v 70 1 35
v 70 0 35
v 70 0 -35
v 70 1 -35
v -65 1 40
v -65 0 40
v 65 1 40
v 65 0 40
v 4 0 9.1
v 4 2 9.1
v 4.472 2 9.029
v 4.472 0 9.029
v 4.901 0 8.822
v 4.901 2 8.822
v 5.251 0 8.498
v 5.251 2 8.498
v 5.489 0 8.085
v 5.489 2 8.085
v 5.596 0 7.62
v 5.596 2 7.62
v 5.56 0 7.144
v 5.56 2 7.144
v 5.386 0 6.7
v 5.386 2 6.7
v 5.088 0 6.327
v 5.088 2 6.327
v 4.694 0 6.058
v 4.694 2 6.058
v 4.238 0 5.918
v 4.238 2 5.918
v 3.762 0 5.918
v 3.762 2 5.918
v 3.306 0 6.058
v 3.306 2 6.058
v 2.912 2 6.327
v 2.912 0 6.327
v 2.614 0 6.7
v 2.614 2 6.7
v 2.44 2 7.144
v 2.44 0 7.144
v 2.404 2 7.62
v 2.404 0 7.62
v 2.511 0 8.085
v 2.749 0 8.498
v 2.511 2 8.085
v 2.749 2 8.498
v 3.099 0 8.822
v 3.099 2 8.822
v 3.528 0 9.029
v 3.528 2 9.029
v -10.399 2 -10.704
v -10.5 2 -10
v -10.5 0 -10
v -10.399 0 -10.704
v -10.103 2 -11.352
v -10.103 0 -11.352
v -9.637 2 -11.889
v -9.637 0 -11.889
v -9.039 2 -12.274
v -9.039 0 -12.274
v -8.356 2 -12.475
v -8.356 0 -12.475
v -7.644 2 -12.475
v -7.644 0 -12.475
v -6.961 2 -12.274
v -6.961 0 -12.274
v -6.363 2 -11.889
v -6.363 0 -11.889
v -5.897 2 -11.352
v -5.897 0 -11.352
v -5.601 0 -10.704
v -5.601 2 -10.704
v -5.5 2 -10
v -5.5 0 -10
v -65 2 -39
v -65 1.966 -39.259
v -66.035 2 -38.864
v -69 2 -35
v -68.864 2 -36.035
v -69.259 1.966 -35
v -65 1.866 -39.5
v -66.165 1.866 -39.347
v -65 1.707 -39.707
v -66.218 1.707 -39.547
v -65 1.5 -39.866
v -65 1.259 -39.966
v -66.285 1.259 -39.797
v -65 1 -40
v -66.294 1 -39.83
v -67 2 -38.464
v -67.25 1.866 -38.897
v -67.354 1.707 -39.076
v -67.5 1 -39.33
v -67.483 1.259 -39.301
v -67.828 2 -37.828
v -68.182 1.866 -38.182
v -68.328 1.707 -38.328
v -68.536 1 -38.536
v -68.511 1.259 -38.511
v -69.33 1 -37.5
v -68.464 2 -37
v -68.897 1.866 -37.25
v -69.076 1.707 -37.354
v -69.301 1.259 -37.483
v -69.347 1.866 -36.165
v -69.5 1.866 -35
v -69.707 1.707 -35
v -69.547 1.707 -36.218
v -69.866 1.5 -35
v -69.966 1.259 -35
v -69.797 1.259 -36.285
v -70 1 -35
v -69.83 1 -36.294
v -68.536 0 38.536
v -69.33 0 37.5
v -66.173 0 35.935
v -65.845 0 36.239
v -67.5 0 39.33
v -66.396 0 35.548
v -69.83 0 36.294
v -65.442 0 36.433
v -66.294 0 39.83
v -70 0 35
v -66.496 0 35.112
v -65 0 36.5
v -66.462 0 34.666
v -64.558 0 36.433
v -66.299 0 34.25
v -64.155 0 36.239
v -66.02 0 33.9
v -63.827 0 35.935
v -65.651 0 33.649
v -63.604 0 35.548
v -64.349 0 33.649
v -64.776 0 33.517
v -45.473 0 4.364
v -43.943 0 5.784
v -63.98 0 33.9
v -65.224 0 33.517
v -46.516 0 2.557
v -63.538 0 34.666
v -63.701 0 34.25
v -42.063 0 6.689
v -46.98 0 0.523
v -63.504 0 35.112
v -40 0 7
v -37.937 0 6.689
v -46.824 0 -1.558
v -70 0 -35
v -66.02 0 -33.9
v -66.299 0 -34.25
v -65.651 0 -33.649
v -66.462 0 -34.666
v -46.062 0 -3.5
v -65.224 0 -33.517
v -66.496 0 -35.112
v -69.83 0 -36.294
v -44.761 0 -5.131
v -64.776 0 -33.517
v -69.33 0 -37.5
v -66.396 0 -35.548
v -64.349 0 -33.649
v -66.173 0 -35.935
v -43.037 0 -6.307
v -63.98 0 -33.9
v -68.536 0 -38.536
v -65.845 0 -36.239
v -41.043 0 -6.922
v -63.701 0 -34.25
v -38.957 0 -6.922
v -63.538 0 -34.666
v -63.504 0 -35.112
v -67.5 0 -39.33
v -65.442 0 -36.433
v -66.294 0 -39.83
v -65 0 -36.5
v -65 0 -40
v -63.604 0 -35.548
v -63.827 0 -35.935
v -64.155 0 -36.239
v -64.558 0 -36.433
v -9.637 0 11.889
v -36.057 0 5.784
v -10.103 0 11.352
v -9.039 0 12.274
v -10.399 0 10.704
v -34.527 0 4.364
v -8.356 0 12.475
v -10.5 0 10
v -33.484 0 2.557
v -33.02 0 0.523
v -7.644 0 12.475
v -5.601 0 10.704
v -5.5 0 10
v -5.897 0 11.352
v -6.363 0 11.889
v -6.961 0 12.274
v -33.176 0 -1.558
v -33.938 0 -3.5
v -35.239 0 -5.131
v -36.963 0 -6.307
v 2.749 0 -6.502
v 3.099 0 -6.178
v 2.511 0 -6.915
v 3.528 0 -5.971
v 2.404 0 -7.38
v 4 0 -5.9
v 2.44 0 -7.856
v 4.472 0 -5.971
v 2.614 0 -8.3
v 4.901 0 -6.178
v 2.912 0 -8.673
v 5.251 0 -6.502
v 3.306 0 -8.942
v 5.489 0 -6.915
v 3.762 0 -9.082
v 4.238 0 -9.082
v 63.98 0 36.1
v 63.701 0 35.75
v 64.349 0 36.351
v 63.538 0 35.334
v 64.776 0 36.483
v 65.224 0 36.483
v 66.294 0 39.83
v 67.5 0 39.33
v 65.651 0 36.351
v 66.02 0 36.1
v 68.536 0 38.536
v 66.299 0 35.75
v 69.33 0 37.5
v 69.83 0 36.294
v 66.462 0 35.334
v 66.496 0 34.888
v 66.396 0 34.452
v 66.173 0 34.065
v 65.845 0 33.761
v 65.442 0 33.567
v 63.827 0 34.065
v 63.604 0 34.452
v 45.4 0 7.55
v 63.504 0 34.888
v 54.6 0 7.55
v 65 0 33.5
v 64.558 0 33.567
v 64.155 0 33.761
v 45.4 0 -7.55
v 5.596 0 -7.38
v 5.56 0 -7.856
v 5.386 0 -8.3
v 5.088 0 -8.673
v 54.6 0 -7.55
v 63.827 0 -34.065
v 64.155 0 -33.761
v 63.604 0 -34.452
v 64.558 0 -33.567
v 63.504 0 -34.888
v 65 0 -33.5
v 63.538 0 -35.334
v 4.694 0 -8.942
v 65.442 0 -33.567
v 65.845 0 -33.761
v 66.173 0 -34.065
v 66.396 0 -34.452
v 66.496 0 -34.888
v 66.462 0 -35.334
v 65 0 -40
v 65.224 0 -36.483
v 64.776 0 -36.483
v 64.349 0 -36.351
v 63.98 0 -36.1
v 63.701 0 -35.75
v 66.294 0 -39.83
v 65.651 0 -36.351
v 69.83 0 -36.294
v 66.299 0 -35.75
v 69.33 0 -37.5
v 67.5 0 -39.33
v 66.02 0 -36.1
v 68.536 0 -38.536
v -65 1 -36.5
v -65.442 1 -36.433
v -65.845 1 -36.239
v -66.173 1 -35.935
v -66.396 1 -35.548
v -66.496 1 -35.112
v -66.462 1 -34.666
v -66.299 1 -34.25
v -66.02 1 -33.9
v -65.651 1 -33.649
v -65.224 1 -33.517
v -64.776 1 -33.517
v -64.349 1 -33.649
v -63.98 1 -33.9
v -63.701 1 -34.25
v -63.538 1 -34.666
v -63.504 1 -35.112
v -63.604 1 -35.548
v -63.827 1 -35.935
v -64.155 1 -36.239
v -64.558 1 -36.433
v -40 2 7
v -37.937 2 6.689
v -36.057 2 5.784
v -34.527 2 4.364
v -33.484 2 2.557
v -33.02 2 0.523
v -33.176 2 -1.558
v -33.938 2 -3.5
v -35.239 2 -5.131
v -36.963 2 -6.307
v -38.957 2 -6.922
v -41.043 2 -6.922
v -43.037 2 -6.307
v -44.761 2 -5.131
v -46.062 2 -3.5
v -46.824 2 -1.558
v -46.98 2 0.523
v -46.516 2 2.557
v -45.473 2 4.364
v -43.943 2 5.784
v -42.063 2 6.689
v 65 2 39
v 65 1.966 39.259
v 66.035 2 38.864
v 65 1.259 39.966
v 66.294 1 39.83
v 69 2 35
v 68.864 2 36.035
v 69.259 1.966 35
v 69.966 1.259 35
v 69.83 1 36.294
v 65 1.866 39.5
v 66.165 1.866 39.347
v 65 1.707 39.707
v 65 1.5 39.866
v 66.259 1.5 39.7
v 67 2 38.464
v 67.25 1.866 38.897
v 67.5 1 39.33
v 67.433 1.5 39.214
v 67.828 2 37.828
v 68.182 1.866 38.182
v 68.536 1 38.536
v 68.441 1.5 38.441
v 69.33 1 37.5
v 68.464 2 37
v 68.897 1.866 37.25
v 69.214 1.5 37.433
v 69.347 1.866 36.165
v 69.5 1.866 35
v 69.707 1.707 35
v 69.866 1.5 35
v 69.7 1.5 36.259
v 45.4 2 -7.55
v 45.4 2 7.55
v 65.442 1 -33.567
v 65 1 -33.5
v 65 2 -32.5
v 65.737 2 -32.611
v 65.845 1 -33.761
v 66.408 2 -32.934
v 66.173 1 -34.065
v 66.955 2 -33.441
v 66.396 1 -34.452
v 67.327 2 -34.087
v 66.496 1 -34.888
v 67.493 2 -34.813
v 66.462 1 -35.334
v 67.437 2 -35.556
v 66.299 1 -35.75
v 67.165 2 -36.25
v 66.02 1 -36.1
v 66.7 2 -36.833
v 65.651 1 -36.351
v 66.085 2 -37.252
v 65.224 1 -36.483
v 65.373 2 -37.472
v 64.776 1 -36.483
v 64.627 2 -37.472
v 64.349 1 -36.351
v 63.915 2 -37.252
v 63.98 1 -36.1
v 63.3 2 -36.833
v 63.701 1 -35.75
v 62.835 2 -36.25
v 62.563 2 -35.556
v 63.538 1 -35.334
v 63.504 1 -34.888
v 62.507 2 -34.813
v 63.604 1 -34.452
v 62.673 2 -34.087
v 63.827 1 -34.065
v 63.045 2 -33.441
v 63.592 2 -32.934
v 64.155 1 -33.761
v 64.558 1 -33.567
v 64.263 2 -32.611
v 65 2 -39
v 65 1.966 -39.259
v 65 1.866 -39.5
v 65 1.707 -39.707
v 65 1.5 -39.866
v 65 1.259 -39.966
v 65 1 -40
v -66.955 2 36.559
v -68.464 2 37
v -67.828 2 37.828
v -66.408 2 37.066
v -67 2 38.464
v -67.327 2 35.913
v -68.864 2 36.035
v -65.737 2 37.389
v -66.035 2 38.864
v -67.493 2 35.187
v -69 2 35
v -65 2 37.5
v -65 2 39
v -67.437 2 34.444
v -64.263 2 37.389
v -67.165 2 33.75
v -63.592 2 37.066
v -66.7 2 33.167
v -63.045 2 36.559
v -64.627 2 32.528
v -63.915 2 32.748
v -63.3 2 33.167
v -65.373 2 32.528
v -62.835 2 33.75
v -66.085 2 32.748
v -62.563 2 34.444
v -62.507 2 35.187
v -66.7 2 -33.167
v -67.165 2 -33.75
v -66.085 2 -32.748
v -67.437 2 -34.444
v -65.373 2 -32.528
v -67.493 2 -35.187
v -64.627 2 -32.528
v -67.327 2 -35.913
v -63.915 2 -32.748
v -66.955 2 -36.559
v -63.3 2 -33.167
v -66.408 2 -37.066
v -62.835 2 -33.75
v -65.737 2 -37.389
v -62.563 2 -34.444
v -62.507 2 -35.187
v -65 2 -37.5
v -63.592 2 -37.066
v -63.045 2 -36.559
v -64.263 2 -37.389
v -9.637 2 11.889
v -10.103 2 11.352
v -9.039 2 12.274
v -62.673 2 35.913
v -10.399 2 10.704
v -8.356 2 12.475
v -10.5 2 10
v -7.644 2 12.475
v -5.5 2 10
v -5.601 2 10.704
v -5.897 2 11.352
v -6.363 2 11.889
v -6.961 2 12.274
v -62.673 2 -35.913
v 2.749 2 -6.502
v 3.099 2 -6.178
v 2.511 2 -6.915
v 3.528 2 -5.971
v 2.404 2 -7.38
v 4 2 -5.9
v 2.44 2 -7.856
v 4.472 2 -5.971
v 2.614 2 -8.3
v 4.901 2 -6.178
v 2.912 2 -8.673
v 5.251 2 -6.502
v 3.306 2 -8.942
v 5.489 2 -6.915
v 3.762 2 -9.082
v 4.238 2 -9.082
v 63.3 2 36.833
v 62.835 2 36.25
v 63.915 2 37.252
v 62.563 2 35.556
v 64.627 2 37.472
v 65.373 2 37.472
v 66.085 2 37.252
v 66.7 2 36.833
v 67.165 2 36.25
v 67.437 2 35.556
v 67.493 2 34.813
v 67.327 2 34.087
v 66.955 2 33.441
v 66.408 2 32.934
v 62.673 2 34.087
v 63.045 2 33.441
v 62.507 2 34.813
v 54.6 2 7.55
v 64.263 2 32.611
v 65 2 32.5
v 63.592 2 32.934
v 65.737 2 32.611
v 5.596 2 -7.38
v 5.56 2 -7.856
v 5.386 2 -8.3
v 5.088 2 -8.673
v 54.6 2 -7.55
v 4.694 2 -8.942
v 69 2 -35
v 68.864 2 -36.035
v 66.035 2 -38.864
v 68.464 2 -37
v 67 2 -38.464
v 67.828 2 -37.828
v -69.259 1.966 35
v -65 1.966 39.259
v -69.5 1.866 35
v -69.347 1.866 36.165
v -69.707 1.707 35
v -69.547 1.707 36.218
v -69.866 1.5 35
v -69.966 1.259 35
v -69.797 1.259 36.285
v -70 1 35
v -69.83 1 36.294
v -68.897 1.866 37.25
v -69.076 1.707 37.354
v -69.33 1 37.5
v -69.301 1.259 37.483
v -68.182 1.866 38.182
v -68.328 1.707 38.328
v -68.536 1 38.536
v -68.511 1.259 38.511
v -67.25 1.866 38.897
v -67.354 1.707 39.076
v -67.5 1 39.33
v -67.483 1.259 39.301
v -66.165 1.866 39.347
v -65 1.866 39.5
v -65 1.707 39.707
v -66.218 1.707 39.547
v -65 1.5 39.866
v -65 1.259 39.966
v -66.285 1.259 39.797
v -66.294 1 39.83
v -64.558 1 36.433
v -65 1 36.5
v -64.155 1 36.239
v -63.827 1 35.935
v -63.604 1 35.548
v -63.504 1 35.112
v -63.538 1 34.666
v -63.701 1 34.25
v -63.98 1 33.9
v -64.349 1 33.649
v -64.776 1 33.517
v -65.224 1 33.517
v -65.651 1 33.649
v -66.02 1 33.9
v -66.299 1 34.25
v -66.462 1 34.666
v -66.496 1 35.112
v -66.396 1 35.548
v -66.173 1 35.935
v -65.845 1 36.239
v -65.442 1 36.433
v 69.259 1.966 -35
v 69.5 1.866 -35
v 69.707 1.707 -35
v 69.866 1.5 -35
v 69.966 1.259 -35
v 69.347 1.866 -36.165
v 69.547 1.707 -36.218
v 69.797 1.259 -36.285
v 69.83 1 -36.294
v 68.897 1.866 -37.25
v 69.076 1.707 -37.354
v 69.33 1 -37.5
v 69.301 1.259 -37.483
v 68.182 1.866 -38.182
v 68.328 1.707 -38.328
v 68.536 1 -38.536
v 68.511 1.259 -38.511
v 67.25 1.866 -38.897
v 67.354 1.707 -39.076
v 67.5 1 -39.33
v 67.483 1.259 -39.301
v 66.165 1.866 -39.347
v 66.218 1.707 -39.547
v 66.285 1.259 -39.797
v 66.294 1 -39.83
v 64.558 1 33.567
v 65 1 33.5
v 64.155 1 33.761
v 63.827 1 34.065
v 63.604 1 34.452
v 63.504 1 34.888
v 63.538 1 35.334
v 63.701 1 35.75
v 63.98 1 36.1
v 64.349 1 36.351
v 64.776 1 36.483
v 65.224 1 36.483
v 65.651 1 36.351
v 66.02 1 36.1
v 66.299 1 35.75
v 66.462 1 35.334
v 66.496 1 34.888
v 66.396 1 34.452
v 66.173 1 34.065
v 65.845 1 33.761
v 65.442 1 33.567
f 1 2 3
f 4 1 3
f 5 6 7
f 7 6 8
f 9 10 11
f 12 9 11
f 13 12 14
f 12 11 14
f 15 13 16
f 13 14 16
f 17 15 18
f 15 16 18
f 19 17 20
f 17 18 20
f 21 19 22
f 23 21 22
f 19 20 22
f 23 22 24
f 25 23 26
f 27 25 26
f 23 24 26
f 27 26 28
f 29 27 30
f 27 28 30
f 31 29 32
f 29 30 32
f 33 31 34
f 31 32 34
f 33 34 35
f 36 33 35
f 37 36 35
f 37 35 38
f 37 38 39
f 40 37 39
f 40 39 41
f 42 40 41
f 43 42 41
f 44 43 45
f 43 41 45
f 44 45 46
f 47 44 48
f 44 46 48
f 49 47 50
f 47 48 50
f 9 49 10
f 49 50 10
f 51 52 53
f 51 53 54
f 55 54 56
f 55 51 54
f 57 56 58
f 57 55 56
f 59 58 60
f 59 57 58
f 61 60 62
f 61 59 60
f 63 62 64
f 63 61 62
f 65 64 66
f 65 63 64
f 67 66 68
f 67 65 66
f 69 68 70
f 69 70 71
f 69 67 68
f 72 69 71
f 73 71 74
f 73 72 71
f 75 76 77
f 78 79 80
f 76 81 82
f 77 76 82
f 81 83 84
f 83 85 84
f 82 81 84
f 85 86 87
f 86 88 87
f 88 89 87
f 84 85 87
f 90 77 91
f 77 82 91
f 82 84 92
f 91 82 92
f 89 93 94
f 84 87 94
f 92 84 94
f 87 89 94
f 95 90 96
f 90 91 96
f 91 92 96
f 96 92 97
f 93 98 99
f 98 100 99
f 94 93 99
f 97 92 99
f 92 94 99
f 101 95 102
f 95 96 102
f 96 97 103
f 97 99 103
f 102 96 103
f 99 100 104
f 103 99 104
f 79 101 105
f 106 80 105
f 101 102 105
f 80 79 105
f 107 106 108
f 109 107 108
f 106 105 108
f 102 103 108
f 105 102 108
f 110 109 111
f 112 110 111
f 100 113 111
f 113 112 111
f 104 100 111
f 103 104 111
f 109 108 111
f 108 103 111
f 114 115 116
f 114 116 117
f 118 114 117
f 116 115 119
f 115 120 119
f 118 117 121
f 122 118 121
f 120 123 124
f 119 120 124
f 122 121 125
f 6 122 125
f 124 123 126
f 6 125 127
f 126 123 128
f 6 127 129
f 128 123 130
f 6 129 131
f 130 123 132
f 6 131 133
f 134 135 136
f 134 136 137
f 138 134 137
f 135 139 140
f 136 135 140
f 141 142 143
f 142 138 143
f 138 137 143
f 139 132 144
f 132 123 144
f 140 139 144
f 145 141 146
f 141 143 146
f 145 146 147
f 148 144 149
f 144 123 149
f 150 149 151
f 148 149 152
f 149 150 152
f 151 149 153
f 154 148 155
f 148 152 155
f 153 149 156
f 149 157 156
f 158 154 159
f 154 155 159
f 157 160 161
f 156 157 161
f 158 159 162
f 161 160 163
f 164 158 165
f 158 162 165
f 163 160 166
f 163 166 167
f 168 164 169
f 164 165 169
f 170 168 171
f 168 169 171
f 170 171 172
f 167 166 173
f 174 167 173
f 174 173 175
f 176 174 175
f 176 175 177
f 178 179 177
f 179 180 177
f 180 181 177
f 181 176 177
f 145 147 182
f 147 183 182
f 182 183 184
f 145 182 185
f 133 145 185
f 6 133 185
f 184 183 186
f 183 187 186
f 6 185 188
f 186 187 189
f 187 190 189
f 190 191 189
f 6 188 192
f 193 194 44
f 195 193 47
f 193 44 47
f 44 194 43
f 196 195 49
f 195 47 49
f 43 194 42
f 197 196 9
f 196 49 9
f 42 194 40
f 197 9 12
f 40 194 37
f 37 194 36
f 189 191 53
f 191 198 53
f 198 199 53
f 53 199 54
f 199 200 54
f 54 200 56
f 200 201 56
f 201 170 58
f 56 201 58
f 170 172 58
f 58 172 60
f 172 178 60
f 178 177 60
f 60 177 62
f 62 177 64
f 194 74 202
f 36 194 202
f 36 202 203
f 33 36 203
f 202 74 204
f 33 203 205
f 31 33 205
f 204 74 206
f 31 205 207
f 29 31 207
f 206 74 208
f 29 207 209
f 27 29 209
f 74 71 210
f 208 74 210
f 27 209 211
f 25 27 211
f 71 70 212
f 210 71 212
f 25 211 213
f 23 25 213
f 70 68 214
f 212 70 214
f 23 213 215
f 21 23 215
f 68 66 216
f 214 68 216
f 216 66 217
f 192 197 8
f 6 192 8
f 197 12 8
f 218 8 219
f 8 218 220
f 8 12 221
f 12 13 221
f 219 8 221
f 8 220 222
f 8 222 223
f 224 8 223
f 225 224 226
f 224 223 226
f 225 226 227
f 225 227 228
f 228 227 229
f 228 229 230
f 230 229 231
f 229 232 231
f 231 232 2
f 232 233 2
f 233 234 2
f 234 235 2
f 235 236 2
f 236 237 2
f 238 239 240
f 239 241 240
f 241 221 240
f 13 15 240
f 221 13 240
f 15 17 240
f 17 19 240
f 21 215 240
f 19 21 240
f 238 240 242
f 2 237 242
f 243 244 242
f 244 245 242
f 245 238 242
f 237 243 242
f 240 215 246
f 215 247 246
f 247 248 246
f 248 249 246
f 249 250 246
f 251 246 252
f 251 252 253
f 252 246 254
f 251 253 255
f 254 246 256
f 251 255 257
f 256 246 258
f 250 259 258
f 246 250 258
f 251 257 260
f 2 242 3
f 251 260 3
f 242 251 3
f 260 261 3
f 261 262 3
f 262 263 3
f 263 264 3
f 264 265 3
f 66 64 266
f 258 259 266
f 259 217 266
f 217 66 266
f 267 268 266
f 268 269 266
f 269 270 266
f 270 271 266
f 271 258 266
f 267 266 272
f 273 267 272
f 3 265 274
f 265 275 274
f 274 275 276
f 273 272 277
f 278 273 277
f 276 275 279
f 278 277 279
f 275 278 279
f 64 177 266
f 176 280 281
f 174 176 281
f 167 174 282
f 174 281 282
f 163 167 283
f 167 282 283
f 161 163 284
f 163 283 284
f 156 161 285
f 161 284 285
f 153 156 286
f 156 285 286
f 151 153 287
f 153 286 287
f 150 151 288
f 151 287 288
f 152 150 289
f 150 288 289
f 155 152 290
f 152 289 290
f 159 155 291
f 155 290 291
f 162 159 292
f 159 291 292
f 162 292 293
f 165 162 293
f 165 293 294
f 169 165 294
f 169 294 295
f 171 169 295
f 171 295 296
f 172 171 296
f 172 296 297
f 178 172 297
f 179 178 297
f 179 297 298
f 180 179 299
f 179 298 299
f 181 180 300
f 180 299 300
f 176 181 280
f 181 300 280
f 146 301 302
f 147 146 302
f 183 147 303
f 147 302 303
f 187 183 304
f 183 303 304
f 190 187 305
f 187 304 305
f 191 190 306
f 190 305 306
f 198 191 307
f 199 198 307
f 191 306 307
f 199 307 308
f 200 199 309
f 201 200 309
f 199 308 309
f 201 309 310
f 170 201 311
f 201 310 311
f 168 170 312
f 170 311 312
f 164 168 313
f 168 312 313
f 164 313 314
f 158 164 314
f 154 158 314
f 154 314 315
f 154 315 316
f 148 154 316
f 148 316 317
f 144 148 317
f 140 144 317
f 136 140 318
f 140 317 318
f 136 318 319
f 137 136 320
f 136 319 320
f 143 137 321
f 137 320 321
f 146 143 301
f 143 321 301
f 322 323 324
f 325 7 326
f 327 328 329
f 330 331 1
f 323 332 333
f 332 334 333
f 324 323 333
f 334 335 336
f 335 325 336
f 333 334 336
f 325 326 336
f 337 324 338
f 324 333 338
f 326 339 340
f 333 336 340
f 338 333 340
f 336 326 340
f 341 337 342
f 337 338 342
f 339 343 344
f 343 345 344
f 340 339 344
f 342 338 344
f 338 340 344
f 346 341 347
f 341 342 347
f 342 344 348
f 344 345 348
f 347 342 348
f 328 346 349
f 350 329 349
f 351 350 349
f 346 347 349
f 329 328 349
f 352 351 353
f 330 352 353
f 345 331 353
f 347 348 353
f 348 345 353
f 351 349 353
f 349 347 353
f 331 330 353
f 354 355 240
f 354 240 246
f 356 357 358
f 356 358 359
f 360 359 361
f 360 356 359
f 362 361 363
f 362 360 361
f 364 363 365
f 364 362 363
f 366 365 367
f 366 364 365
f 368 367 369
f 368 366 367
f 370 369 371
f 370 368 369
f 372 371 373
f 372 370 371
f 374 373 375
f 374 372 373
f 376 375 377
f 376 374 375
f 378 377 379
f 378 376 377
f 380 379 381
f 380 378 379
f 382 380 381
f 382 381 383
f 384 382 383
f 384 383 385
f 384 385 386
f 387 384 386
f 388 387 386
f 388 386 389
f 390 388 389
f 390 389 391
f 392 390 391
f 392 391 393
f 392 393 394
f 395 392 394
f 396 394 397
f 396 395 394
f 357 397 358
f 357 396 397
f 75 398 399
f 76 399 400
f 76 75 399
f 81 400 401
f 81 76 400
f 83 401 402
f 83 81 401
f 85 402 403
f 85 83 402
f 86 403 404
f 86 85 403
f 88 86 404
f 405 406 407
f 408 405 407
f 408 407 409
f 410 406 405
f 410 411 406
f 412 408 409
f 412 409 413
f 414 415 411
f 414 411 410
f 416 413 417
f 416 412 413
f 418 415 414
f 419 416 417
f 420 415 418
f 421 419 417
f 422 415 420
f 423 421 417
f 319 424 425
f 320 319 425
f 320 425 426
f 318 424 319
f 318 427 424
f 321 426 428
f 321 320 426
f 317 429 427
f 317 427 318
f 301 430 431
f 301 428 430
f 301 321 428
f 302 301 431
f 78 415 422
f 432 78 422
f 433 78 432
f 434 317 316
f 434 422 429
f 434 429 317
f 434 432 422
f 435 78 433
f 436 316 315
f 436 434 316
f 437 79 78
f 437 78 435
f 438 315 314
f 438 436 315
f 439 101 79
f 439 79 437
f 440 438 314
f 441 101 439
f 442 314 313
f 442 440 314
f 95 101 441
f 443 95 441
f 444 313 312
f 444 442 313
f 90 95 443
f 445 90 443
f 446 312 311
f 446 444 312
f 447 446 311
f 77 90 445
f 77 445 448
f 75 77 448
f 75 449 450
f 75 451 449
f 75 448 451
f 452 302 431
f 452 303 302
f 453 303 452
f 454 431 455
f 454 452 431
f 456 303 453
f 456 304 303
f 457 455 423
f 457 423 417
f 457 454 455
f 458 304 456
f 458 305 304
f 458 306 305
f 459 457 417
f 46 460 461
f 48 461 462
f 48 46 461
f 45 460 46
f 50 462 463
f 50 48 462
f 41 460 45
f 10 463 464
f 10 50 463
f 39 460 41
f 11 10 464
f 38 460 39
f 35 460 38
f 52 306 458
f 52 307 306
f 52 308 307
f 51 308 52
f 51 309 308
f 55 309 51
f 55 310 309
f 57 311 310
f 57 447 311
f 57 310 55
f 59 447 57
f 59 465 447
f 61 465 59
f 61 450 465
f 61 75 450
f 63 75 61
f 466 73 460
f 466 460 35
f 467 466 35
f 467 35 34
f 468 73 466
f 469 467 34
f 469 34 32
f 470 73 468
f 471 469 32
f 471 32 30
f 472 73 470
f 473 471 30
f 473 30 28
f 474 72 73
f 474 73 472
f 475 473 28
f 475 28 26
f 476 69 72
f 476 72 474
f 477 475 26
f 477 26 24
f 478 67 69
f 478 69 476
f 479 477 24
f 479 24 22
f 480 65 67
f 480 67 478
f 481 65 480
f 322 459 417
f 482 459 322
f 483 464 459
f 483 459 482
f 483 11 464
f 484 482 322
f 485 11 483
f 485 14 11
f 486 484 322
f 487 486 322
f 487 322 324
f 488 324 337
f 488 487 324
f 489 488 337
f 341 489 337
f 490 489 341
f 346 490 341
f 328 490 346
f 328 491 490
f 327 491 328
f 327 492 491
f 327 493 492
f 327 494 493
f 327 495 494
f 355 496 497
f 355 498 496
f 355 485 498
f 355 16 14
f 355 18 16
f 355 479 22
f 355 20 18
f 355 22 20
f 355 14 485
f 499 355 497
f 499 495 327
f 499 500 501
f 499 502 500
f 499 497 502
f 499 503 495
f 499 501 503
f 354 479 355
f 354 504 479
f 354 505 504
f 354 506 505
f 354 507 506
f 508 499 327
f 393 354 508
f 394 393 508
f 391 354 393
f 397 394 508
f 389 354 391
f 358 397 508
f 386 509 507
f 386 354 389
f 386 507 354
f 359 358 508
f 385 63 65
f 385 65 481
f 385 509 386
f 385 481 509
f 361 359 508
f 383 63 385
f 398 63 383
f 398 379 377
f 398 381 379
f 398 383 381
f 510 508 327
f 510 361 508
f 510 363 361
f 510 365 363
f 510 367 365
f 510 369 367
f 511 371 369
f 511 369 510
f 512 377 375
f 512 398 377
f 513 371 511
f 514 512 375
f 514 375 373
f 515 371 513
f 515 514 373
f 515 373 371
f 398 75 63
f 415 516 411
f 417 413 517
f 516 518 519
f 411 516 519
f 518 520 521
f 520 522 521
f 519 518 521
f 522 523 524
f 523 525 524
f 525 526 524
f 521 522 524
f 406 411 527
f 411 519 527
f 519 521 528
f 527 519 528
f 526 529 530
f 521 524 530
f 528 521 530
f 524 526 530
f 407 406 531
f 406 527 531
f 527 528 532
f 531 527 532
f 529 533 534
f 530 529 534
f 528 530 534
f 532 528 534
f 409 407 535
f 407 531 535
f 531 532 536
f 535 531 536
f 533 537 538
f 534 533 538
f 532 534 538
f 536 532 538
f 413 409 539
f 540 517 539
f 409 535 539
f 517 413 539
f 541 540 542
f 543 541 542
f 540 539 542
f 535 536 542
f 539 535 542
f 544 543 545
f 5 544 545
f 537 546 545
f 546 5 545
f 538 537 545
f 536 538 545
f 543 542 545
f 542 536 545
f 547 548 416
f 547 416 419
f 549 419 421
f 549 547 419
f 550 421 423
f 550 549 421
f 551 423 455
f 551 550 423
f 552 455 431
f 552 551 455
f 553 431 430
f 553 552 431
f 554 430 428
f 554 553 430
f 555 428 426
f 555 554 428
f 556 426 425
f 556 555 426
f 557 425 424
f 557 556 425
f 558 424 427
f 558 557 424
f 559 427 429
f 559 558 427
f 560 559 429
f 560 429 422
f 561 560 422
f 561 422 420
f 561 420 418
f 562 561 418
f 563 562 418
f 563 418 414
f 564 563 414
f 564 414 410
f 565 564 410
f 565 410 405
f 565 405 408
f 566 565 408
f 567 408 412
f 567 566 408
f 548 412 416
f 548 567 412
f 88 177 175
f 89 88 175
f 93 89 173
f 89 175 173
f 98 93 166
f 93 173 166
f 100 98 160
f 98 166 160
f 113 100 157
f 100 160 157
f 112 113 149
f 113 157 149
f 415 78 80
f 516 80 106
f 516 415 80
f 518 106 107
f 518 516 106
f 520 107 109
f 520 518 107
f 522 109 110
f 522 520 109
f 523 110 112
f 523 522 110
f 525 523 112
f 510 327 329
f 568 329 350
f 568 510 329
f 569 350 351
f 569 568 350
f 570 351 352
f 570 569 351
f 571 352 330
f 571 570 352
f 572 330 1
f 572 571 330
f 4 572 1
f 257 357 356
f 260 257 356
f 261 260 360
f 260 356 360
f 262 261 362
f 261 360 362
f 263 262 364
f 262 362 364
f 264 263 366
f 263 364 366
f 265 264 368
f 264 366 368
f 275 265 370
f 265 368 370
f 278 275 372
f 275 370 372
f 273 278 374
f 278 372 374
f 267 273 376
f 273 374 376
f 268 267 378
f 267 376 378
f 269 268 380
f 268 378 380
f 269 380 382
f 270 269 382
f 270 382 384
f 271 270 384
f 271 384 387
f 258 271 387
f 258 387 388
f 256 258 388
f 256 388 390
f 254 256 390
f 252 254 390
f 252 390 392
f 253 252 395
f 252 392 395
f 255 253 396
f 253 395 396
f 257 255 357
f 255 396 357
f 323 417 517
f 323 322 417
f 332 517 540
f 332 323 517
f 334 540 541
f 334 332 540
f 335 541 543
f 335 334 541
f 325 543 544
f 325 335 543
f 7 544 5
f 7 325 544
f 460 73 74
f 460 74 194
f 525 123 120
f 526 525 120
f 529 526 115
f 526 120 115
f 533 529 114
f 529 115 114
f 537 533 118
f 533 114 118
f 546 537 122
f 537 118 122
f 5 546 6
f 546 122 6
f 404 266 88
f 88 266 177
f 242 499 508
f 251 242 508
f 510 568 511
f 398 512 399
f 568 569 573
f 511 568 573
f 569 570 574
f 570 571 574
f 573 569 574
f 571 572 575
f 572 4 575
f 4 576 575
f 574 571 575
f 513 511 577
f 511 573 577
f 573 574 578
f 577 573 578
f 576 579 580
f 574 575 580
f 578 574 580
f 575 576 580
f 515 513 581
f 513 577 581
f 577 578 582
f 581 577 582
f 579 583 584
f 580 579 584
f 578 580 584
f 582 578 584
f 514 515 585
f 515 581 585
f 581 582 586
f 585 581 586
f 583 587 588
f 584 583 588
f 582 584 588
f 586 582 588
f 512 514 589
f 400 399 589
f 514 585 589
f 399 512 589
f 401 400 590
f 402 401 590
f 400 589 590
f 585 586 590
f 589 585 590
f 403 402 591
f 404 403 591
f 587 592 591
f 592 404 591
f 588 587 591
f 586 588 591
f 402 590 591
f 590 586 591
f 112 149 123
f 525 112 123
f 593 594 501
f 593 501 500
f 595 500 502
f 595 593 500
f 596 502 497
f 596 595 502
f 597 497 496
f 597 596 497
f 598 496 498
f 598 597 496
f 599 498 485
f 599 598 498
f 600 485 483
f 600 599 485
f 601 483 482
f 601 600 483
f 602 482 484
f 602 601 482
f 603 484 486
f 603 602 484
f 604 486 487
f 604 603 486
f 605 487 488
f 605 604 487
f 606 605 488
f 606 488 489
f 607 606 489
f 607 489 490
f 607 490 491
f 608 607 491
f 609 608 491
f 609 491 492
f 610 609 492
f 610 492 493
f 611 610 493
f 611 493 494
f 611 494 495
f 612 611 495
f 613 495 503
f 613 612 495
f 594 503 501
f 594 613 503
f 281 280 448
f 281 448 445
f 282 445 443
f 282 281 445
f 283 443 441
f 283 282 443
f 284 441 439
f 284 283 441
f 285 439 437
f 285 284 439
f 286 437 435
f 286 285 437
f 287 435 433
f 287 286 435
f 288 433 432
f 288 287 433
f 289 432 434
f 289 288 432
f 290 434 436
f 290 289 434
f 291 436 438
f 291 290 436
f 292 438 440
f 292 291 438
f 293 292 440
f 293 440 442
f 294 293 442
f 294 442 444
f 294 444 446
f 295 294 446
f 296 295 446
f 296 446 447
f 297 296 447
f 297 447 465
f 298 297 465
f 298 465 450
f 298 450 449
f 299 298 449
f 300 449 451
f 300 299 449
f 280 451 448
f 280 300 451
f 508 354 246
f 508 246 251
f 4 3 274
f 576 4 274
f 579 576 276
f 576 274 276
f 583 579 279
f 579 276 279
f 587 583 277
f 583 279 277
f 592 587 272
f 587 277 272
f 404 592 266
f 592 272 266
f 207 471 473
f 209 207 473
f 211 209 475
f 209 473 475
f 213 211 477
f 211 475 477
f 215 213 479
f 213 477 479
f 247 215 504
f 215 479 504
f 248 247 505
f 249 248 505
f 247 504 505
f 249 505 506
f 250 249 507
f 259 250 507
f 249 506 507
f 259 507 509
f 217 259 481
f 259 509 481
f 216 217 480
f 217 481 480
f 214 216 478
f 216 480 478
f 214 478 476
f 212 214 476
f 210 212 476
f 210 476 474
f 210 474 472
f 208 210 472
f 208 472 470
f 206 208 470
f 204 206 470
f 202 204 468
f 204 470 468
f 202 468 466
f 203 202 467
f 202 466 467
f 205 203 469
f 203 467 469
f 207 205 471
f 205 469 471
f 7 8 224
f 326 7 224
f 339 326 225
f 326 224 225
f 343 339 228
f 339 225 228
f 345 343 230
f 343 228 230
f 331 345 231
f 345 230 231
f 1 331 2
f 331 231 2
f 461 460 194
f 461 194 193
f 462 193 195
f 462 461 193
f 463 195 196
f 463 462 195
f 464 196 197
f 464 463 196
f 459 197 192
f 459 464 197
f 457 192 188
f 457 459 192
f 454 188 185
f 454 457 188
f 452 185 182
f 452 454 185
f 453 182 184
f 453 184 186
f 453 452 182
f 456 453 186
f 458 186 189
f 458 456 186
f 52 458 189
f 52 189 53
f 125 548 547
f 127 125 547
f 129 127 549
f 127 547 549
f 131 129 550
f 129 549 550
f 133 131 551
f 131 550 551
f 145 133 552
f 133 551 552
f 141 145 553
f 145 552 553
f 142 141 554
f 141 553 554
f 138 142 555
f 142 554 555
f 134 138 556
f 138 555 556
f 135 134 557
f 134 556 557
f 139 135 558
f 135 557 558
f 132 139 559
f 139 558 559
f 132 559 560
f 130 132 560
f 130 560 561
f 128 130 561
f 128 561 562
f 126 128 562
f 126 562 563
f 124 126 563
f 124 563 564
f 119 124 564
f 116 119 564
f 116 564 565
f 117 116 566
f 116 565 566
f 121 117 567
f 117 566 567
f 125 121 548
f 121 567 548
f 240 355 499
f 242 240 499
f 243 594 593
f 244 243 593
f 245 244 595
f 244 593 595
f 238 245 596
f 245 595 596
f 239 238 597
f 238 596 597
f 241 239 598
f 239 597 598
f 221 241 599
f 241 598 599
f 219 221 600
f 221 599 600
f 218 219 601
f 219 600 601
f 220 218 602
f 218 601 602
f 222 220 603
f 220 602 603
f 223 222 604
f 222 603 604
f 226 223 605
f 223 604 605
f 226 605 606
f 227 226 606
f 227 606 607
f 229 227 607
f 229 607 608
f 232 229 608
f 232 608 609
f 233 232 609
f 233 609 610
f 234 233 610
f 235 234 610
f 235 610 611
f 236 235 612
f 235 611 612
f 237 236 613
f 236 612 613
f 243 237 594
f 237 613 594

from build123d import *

# Parameters (mm, degrees)
SALIENTE_EXTRUIR1_DEPTH = 2
CROQUIS2_R              = 1.5
CORTAR_EXTRUIR1_DEPTH   = 2
CHAFL_N1_SIZE           = 1
CROQUIS3_R              = 1.6
CORTAR_EXTRUIR2_DEPTH   = 2
CROQUIS4_R              = 7
CROQUIS4_W              = 9.2
CROQUIS4_H              = 15.1
CORTAR_EXTRUIR3_DEPTH   = 2
REDONDEO1_R             = 1


with BuildPart() as part:
    # Croquis1 → Saliente-Extruir1 (new body)
    with BuildSketch(Plane(origin=(0, 0, 0), x_dir=(1, 0, 0), z_dir=(0, 1, 0))):
        with BuildLine():
            Line((-65, -40), (65, -40))
            ThreePointArc((65, -40), (68.535533906, -38.535533906), (70, -35))
            Line((70, -35), (70, 35))
            ThreePointArc((70, 35), (68.535533906, 38.535533906), (65, 40))
            Line((65, 40), (-65, 40))
            ThreePointArc((-65, 40), (-68.535533906, 38.535533906), (-70, 35))
            Line((-70, 35), (-70, -35))
            ThreePointArc((-70, -35), (-68.535533906, -38.535533906), (-65, -40))
        make_face()
    extrude(amount=SALIENTE_EXTRUIR1_DEPTH)

    # Croquis2 → Cortar-Extruir1 (cut)
    with BuildSketch(Plane(origin=(0, 2, 0), x_dir=(1, 0, 0), z_dir=(0, 1, 0))):
        with Locations(Location((65, 35, 0), (0, 0, 270))):
            Circle(CROQUIS2_R)
        with Locations(Location((65, -35, 0), (0, 0, 90))):
            Circle(CROQUIS2_R)
        with Locations(Location((-65, -35, 0), (0, 0, 270))):
            Circle(CROQUIS2_R)
        with Locations(Location((-65, 35, 0), (0, 0, 90))):
            Circle(CROQUIS2_R)
    extrude(amount=-CORTAR_EXTRUIR1_DEPTH, mode=Mode.SUBTRACT)

    # Chaflán1
    chafl_n1_edges = [part.edges().sort_by_distance(p)[0] for p in [
        (-65, 2, -33.5),
        (-65, 2, 33.5),
        (65, 2, 36.5),
        (65, 2, -36.5),
    ]]
    chamfer(chafl_n1_edges, length=CHAFL_N1_SIZE)

    # Croquis3 → Cortar-Extruir2 (cut)
    with BuildSketch(Plane(origin=(0, 2, 0), x_dir=(1, 0, 0), z_dir=(0, 1, 0))):
        with Locations(Location((4, 7.5, 0), (0, 0, 270))):
            Circle(CROQUIS3_R)
        with Locations(Location((4, -7.5, 0), (0, 0, 270))):
            Circle(CROQUIS3_R)
        with BuildLine():
            Line((-10.5, -10), (-10.5, 10))
            ThreePointArc((-10.5, 10), (-8, 12.5), (-5.5, 10))
            Line((-5.5, 10), (-5.5, -10))
            ThreePointArc((-5.5, -10), (-8, -12.5), (-10.5, -10))
        make_face()
    extrude(amount=-CORTAR_EXTRUIR2_DEPTH, mode=Mode.SUBTRACT)

    # Croquis4 → Cortar-Extruir3 (cut)
    with BuildSketch(Plane(origin=(0, 2, 0), x_dir=(1, 0, 0), z_dir=(0, 1, 0))):
        with Locations(Location((-40, 0, 0), (0, 0, 270))):
            Circle(CROQUIS4_R)
        with Locations((50, 0)):
            Rectangle(CROQUIS4_W, CROQUIS4_H)
    extrude(amount=-CORTAR_EXTRUIR3_DEPTH, mode=Mode.SUBTRACT)

    # Redondeo1
    redondeo1_edges = [part.edges().sort_by_distance(p)[0] for p in [
        (68.535533906, 2, 38.535533906),
        (70, 2, 0),
        (68.535533906, 2, -38.535533906),
        (0, 2, -40),
        (-68.535533906, 2, -38.535533906),
        (-70, 2, 0),
        (-68.535533906, 2, 38.535533906),
        (0, 2, 40),
    ]]
    fillet(redondeo1_edges, radius=REDONDEO1_R)


solid = part.part
